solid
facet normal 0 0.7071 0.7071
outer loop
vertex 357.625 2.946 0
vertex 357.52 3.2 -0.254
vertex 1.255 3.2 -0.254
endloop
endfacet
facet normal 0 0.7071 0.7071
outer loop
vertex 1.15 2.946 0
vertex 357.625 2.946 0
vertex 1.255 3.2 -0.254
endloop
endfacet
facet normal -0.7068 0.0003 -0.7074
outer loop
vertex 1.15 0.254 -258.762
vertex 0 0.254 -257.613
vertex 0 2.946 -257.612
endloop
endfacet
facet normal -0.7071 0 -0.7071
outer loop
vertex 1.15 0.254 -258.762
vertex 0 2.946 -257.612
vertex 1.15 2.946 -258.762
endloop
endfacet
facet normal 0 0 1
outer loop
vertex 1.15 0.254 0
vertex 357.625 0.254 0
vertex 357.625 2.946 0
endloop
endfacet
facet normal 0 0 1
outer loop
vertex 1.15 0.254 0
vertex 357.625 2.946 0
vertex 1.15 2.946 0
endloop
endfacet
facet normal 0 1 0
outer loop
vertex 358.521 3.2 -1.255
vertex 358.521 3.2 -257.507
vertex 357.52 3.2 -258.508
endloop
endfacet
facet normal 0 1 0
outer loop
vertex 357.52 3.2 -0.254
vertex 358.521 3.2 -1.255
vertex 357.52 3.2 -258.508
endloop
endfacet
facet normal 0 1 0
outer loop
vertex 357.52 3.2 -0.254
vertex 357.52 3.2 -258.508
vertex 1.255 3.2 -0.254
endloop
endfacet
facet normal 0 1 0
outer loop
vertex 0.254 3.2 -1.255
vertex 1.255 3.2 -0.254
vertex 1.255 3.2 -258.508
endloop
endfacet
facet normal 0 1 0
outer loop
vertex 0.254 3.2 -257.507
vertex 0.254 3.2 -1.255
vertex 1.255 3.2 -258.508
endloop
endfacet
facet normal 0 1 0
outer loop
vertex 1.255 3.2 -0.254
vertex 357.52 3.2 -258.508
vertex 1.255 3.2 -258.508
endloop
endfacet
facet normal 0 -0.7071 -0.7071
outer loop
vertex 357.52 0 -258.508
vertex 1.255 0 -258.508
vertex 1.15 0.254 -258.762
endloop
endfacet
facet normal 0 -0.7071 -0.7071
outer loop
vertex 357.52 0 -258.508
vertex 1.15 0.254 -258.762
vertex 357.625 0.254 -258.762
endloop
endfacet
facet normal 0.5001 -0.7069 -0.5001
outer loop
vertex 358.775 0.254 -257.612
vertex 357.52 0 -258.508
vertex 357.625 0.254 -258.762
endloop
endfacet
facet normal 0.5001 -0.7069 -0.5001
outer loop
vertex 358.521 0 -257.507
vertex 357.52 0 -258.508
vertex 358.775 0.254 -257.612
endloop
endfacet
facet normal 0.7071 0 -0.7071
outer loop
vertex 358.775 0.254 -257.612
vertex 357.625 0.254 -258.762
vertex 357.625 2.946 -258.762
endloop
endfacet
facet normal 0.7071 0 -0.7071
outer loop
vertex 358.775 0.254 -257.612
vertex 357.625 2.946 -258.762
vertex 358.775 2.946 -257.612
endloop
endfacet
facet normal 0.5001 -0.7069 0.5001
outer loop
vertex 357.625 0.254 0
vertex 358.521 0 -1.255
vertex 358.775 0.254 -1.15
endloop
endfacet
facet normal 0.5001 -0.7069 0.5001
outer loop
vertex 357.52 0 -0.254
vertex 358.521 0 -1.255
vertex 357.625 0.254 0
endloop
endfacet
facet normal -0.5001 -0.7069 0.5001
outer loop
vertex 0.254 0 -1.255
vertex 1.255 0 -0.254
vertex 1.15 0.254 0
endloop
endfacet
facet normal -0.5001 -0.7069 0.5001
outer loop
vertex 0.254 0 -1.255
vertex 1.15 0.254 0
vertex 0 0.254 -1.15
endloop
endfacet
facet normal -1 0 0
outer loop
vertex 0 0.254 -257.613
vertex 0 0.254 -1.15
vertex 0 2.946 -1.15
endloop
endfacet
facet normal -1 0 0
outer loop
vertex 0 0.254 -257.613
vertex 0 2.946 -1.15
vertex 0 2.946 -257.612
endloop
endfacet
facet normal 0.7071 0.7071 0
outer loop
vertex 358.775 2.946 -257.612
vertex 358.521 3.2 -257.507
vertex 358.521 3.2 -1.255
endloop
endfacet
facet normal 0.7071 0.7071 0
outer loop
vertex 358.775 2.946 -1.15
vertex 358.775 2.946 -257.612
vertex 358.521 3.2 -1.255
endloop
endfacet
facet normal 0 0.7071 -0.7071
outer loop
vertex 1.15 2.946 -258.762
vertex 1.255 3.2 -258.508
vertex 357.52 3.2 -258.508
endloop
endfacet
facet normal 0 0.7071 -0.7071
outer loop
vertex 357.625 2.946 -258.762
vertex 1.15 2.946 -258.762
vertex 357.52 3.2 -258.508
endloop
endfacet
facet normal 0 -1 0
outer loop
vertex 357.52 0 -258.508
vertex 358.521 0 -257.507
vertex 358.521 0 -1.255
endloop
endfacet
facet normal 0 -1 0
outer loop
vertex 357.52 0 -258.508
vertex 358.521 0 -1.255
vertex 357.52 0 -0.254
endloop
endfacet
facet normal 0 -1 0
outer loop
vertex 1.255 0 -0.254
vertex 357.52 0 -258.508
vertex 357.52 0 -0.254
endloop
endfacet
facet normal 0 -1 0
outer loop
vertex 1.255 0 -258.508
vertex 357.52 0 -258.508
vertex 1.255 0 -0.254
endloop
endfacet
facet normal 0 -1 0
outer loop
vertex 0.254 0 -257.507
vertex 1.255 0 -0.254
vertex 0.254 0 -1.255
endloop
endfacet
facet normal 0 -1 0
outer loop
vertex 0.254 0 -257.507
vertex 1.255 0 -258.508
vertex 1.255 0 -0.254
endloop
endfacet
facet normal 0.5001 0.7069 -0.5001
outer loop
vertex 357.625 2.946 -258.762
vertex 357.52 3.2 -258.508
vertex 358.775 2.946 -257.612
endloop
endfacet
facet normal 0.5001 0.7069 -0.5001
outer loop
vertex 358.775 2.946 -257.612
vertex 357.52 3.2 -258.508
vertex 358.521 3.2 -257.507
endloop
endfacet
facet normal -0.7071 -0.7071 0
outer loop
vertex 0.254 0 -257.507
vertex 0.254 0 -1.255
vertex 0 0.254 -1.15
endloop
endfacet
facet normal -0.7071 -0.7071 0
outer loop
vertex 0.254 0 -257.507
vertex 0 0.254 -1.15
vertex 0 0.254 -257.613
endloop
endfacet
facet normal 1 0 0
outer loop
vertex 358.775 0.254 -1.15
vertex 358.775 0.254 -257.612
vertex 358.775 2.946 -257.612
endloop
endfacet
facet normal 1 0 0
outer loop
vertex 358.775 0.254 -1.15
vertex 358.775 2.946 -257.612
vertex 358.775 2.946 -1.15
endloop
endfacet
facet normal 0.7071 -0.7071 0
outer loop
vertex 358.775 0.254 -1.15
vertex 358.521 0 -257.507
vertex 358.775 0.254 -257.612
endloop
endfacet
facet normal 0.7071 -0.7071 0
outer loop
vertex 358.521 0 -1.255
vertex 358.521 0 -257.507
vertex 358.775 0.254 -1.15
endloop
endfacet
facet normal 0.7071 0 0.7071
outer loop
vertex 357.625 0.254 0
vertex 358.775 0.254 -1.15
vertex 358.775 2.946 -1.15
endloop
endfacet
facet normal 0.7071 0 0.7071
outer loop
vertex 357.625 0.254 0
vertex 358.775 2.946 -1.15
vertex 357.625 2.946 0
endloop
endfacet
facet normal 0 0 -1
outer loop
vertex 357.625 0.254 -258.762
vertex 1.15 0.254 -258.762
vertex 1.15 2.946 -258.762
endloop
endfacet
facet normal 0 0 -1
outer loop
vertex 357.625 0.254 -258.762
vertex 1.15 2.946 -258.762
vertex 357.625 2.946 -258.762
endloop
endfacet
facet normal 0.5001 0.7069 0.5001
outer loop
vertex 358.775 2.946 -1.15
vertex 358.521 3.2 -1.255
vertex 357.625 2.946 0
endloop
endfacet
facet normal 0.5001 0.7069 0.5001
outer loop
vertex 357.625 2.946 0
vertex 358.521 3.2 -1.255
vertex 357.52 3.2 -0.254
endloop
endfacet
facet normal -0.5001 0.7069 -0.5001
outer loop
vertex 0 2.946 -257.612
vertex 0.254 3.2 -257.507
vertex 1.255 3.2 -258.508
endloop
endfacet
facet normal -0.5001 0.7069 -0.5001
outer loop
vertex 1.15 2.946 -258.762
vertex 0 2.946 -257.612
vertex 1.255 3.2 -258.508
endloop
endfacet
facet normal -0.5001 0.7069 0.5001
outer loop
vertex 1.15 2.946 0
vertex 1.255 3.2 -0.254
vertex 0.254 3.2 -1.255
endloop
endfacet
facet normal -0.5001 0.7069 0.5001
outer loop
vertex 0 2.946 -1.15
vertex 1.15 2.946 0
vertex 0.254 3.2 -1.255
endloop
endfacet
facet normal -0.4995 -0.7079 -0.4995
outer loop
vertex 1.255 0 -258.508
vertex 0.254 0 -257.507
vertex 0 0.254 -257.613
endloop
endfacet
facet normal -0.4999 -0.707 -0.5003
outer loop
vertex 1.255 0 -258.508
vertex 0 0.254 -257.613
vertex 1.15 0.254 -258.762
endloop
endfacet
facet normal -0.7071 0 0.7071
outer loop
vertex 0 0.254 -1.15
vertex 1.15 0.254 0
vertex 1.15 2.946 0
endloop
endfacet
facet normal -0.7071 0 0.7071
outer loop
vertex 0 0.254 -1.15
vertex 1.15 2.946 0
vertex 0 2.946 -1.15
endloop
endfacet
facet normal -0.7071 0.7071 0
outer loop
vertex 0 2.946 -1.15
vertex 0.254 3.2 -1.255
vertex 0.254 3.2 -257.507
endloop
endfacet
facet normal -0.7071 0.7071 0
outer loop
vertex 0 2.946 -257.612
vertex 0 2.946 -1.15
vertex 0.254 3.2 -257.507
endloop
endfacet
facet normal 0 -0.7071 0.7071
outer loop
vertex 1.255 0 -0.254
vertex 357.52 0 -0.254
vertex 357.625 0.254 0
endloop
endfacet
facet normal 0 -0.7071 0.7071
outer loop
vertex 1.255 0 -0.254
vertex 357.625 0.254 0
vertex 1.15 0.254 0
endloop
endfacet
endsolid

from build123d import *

# Parameters (mm, degrees)
BOSS_EXTRUDE1_DEPTH = 3.2
CHAMFER1_SIZE       = 0.254


with BuildPart() as part:
    # Sketch1 → Boss-Extrude1 (new body)
    with BuildSketch(Plane(origin=(0, 0, 0), x_dir=(1, 0, 0), z_dir=(0, 1, 0))):
        Polygon((0, 257.6125), (1.15, 258.7625), (357.625, 258.7625), (358.775, 257.6125), (358.775, 1.15), (357.625, 0), (1.15, 0), (0, 1.15), align=None)
    extrude(amount=BOSS_EXTRUDE1_DEPTH)

    # Chamfer1
    chamfer1_edges = [part.edges().sort_by_distance(p)[0] for p in [
        (179.3875, 3.2, 0),
        (0.575, 0, -0.575),
        (0, 0, -129.38125),
        (358.2, 3.2, -0.575),
        (358.775, 3.2, -129.38125),
        (358.2, 3.2, -258.1875),
        (179.3875, 3.2, -258.7625),
        (0.575, 3.2, -258.1875),
        (0, 3.2, -129.38125),
        (0.575, 3.2, -0.575),
        (0.575, 0, -258.1875),
        (179.3875, 0, -258.7625),
        (358.2, 0, -258.1875),
        (358.775, 0, -129.38125),
        (358.2, 0, -0.575),
        (179.3875, 0, 0),
    ]]
    chamfer(chamfer1_edges, length=CHAMFER1_SIZE)


solid = part.part
